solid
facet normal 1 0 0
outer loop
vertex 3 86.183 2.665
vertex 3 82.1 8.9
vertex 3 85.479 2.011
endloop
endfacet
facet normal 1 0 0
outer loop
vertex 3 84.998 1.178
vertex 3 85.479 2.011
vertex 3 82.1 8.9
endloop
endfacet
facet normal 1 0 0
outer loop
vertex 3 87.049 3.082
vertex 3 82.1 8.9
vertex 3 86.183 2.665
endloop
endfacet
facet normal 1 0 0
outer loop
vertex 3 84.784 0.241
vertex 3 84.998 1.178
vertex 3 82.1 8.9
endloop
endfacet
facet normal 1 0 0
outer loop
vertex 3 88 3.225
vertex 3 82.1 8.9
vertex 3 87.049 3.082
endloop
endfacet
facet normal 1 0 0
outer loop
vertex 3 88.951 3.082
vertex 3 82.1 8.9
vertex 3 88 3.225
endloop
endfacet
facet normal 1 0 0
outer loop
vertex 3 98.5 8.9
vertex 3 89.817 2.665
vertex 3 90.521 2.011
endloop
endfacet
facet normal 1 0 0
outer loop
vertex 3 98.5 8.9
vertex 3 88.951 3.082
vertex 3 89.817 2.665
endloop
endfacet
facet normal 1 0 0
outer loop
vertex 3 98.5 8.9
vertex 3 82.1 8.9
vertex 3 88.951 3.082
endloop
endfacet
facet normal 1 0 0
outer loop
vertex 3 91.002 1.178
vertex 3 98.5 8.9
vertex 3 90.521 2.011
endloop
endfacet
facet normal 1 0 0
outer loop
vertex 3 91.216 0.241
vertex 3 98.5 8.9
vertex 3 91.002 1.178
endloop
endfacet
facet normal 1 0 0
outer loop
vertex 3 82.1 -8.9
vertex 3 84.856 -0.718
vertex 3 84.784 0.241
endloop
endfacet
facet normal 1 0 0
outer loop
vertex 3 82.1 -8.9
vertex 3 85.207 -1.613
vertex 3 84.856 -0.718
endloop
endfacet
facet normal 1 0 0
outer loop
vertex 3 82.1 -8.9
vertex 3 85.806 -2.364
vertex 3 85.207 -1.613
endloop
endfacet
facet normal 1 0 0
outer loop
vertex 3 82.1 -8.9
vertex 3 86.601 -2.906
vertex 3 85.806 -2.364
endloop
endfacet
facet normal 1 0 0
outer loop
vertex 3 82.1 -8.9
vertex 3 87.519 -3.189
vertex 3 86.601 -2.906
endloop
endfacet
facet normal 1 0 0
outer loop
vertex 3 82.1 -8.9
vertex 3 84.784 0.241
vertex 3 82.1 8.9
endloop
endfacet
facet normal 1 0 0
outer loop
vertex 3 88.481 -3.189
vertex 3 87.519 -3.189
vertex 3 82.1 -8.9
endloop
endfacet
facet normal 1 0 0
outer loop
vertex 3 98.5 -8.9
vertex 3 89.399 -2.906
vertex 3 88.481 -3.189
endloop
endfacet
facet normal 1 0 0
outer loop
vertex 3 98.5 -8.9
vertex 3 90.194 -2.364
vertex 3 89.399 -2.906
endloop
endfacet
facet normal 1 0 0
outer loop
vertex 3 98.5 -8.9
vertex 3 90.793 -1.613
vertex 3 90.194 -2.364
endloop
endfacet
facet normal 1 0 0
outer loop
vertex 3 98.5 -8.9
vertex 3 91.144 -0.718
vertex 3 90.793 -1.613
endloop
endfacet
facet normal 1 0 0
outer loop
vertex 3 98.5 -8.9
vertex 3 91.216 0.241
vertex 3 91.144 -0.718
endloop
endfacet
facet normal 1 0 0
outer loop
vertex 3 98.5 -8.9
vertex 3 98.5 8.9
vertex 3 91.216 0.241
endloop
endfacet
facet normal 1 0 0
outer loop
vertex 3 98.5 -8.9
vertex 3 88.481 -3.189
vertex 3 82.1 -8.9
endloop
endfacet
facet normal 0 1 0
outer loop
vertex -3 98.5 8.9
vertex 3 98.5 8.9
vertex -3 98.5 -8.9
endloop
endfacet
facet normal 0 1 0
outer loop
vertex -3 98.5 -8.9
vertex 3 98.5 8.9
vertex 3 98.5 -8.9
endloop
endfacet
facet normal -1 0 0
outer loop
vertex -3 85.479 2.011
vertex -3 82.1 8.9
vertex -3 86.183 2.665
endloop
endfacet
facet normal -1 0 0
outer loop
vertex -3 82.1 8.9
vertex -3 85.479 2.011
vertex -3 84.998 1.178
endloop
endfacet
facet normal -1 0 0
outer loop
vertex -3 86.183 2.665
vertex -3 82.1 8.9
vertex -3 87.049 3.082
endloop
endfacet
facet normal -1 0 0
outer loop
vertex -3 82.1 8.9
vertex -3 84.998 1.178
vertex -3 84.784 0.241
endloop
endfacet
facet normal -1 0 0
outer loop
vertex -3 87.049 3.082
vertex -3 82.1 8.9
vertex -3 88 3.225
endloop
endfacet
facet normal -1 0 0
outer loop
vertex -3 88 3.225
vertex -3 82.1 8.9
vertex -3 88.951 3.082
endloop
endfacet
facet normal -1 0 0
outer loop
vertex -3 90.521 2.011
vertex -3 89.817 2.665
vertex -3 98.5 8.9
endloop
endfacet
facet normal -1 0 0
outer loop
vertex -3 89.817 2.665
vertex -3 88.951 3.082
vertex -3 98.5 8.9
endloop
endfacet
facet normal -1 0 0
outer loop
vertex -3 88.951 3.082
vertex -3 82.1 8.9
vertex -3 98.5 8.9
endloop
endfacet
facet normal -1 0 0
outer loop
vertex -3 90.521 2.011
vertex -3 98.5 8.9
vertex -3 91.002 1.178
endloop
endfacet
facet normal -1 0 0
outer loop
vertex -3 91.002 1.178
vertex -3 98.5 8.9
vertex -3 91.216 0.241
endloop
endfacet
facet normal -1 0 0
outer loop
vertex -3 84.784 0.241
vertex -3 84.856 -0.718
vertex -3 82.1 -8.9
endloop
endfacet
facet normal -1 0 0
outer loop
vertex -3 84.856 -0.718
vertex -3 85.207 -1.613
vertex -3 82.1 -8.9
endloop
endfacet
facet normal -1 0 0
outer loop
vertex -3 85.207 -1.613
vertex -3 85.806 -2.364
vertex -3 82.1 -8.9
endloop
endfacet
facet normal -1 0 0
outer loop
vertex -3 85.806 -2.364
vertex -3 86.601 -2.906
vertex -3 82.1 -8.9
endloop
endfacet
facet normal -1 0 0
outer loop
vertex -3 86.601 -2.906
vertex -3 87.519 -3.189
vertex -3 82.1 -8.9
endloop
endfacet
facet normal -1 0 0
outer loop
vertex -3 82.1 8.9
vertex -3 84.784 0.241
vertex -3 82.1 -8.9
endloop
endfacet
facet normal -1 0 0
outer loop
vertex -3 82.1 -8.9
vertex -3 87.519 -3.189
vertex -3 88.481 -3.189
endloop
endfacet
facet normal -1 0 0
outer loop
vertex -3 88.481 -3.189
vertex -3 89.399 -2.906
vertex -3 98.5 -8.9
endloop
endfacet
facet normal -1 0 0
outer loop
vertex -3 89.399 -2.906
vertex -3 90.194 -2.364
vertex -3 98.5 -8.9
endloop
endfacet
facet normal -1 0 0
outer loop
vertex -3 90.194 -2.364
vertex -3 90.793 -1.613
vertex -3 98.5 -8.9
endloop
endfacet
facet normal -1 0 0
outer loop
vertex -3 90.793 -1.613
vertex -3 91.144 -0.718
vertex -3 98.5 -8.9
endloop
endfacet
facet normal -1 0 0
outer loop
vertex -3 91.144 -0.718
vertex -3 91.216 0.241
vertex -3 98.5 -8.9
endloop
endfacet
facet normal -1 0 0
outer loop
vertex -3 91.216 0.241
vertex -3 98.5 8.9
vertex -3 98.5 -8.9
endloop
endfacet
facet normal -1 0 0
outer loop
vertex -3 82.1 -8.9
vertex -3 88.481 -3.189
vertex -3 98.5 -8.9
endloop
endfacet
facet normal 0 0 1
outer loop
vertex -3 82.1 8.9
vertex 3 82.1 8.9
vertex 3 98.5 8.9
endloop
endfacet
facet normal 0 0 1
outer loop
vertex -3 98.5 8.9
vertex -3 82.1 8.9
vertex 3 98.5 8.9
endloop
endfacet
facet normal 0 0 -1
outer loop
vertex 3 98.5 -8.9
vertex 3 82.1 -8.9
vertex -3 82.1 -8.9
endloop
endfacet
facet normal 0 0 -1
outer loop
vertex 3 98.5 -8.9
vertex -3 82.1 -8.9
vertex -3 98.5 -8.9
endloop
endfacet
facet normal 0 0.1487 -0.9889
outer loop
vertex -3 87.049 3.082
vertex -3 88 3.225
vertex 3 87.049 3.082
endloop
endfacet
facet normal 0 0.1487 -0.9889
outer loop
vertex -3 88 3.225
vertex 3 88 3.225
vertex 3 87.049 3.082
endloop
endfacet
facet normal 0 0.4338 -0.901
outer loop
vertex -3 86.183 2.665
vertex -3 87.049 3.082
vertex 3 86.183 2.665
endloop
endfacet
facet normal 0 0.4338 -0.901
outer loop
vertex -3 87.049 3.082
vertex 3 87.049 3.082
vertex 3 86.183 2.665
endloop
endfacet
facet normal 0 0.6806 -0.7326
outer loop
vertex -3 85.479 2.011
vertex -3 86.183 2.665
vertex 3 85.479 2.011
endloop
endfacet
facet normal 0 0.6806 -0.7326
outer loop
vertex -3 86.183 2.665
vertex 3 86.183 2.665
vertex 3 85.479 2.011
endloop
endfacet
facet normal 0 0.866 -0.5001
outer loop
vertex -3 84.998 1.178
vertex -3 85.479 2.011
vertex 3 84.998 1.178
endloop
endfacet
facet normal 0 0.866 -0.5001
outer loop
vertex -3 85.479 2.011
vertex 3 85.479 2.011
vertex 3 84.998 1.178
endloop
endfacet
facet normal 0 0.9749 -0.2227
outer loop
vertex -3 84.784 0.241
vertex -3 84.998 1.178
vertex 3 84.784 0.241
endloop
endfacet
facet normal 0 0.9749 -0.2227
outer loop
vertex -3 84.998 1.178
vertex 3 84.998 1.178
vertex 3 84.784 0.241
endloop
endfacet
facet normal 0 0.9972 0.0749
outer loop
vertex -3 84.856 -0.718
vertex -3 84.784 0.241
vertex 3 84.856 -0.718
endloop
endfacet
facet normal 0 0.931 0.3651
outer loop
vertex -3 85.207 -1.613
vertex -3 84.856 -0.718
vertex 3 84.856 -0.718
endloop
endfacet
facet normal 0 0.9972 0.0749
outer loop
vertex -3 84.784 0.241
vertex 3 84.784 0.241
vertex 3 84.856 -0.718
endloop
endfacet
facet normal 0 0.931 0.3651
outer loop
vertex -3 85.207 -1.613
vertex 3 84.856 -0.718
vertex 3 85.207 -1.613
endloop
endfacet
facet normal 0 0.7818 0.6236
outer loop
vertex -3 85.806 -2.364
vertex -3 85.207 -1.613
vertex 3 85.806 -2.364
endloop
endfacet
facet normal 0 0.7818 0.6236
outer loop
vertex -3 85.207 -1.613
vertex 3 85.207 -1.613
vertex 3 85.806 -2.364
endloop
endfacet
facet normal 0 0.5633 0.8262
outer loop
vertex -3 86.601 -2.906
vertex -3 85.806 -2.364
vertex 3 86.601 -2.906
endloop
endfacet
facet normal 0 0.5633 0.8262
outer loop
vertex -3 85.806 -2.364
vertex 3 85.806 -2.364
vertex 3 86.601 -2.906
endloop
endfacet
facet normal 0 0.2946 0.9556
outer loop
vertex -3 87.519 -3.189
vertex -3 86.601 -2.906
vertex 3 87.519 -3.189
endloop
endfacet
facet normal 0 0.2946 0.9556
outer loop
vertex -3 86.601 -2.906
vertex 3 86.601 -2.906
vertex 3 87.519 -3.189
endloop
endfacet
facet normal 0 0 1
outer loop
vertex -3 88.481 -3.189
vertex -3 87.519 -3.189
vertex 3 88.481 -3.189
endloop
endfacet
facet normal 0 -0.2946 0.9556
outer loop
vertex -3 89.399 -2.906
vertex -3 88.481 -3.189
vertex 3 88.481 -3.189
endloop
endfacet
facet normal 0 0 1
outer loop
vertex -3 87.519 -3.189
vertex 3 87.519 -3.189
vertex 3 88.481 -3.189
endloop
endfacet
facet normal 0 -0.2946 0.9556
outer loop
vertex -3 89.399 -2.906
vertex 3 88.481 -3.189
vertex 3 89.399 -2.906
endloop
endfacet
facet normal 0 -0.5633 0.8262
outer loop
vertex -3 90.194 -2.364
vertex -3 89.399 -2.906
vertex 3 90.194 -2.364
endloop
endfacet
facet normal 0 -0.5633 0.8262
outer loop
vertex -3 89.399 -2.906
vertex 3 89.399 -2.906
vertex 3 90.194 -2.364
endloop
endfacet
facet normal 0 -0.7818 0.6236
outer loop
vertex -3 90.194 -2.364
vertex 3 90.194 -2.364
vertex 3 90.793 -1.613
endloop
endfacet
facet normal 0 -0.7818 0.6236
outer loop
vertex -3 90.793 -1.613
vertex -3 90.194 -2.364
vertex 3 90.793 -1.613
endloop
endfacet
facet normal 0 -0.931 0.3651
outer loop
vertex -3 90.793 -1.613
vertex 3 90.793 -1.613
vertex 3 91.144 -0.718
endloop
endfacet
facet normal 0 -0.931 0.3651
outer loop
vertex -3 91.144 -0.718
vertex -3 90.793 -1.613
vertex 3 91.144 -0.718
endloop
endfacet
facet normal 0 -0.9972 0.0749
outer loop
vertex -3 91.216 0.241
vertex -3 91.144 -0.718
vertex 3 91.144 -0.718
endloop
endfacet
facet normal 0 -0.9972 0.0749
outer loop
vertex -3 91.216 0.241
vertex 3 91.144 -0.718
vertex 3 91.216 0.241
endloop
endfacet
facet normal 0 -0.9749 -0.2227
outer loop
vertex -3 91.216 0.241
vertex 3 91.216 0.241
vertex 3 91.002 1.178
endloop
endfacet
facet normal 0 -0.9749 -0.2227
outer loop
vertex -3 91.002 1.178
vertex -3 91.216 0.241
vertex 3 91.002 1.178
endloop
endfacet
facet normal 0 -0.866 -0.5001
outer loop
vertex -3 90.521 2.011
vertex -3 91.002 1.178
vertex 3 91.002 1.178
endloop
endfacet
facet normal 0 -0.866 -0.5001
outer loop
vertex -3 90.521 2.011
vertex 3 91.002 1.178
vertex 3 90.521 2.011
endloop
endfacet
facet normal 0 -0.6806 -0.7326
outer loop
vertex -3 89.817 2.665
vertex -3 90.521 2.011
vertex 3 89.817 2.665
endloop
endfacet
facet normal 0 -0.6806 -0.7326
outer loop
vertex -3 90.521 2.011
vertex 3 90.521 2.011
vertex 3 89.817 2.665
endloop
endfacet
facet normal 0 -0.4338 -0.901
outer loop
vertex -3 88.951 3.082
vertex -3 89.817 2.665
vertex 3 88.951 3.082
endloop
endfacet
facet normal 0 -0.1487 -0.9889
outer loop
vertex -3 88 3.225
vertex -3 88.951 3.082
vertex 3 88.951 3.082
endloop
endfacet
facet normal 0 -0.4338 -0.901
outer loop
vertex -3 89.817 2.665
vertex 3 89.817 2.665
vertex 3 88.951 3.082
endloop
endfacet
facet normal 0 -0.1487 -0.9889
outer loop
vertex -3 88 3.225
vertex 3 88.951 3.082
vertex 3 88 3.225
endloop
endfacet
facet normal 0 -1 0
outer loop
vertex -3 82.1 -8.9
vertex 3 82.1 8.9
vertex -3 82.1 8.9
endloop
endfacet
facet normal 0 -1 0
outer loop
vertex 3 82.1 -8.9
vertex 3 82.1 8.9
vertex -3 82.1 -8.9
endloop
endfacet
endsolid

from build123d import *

# Parameters (mm, degrees)
BLOCK_SKETCH_W     = 17.8
BLOCK_SKETCH_H     = 16.4
BLOCK_DEPTH        = 3
TUBE_HOLE_SKETCH_R = 3.225
TUBE_HOLE_DEPTH    = 4


with BuildPart() as part:
    # Block Sketch → Block (new, symmetric)
    with BuildSketch(Plane(origin=(0, 0, 0), x_dir=(0, 0, -1), z_dir=(1, 0, 0))):
        with Locations((0, 90.3)):
            Rectangle(BLOCK_SKETCH_W, BLOCK_SKETCH_H)
    extrude(amount=BLOCK_DEPTH, both=True)

    # Tube Hole Sketch → Tube Hole (cut, symmetric)
    with BuildSketch(Plane(origin=(0, 0, 0), x_dir=(0, 0, -1), z_dir=(1, 0, 0))):
        with Locations((0, 88)):
            Circle(TUBE_HOLE_SKETCH_R)
    extrude(amount=TUBE_HOLE_DEPTH, both=True, mode=Mode.SUBTRACT)


solid = part.part
